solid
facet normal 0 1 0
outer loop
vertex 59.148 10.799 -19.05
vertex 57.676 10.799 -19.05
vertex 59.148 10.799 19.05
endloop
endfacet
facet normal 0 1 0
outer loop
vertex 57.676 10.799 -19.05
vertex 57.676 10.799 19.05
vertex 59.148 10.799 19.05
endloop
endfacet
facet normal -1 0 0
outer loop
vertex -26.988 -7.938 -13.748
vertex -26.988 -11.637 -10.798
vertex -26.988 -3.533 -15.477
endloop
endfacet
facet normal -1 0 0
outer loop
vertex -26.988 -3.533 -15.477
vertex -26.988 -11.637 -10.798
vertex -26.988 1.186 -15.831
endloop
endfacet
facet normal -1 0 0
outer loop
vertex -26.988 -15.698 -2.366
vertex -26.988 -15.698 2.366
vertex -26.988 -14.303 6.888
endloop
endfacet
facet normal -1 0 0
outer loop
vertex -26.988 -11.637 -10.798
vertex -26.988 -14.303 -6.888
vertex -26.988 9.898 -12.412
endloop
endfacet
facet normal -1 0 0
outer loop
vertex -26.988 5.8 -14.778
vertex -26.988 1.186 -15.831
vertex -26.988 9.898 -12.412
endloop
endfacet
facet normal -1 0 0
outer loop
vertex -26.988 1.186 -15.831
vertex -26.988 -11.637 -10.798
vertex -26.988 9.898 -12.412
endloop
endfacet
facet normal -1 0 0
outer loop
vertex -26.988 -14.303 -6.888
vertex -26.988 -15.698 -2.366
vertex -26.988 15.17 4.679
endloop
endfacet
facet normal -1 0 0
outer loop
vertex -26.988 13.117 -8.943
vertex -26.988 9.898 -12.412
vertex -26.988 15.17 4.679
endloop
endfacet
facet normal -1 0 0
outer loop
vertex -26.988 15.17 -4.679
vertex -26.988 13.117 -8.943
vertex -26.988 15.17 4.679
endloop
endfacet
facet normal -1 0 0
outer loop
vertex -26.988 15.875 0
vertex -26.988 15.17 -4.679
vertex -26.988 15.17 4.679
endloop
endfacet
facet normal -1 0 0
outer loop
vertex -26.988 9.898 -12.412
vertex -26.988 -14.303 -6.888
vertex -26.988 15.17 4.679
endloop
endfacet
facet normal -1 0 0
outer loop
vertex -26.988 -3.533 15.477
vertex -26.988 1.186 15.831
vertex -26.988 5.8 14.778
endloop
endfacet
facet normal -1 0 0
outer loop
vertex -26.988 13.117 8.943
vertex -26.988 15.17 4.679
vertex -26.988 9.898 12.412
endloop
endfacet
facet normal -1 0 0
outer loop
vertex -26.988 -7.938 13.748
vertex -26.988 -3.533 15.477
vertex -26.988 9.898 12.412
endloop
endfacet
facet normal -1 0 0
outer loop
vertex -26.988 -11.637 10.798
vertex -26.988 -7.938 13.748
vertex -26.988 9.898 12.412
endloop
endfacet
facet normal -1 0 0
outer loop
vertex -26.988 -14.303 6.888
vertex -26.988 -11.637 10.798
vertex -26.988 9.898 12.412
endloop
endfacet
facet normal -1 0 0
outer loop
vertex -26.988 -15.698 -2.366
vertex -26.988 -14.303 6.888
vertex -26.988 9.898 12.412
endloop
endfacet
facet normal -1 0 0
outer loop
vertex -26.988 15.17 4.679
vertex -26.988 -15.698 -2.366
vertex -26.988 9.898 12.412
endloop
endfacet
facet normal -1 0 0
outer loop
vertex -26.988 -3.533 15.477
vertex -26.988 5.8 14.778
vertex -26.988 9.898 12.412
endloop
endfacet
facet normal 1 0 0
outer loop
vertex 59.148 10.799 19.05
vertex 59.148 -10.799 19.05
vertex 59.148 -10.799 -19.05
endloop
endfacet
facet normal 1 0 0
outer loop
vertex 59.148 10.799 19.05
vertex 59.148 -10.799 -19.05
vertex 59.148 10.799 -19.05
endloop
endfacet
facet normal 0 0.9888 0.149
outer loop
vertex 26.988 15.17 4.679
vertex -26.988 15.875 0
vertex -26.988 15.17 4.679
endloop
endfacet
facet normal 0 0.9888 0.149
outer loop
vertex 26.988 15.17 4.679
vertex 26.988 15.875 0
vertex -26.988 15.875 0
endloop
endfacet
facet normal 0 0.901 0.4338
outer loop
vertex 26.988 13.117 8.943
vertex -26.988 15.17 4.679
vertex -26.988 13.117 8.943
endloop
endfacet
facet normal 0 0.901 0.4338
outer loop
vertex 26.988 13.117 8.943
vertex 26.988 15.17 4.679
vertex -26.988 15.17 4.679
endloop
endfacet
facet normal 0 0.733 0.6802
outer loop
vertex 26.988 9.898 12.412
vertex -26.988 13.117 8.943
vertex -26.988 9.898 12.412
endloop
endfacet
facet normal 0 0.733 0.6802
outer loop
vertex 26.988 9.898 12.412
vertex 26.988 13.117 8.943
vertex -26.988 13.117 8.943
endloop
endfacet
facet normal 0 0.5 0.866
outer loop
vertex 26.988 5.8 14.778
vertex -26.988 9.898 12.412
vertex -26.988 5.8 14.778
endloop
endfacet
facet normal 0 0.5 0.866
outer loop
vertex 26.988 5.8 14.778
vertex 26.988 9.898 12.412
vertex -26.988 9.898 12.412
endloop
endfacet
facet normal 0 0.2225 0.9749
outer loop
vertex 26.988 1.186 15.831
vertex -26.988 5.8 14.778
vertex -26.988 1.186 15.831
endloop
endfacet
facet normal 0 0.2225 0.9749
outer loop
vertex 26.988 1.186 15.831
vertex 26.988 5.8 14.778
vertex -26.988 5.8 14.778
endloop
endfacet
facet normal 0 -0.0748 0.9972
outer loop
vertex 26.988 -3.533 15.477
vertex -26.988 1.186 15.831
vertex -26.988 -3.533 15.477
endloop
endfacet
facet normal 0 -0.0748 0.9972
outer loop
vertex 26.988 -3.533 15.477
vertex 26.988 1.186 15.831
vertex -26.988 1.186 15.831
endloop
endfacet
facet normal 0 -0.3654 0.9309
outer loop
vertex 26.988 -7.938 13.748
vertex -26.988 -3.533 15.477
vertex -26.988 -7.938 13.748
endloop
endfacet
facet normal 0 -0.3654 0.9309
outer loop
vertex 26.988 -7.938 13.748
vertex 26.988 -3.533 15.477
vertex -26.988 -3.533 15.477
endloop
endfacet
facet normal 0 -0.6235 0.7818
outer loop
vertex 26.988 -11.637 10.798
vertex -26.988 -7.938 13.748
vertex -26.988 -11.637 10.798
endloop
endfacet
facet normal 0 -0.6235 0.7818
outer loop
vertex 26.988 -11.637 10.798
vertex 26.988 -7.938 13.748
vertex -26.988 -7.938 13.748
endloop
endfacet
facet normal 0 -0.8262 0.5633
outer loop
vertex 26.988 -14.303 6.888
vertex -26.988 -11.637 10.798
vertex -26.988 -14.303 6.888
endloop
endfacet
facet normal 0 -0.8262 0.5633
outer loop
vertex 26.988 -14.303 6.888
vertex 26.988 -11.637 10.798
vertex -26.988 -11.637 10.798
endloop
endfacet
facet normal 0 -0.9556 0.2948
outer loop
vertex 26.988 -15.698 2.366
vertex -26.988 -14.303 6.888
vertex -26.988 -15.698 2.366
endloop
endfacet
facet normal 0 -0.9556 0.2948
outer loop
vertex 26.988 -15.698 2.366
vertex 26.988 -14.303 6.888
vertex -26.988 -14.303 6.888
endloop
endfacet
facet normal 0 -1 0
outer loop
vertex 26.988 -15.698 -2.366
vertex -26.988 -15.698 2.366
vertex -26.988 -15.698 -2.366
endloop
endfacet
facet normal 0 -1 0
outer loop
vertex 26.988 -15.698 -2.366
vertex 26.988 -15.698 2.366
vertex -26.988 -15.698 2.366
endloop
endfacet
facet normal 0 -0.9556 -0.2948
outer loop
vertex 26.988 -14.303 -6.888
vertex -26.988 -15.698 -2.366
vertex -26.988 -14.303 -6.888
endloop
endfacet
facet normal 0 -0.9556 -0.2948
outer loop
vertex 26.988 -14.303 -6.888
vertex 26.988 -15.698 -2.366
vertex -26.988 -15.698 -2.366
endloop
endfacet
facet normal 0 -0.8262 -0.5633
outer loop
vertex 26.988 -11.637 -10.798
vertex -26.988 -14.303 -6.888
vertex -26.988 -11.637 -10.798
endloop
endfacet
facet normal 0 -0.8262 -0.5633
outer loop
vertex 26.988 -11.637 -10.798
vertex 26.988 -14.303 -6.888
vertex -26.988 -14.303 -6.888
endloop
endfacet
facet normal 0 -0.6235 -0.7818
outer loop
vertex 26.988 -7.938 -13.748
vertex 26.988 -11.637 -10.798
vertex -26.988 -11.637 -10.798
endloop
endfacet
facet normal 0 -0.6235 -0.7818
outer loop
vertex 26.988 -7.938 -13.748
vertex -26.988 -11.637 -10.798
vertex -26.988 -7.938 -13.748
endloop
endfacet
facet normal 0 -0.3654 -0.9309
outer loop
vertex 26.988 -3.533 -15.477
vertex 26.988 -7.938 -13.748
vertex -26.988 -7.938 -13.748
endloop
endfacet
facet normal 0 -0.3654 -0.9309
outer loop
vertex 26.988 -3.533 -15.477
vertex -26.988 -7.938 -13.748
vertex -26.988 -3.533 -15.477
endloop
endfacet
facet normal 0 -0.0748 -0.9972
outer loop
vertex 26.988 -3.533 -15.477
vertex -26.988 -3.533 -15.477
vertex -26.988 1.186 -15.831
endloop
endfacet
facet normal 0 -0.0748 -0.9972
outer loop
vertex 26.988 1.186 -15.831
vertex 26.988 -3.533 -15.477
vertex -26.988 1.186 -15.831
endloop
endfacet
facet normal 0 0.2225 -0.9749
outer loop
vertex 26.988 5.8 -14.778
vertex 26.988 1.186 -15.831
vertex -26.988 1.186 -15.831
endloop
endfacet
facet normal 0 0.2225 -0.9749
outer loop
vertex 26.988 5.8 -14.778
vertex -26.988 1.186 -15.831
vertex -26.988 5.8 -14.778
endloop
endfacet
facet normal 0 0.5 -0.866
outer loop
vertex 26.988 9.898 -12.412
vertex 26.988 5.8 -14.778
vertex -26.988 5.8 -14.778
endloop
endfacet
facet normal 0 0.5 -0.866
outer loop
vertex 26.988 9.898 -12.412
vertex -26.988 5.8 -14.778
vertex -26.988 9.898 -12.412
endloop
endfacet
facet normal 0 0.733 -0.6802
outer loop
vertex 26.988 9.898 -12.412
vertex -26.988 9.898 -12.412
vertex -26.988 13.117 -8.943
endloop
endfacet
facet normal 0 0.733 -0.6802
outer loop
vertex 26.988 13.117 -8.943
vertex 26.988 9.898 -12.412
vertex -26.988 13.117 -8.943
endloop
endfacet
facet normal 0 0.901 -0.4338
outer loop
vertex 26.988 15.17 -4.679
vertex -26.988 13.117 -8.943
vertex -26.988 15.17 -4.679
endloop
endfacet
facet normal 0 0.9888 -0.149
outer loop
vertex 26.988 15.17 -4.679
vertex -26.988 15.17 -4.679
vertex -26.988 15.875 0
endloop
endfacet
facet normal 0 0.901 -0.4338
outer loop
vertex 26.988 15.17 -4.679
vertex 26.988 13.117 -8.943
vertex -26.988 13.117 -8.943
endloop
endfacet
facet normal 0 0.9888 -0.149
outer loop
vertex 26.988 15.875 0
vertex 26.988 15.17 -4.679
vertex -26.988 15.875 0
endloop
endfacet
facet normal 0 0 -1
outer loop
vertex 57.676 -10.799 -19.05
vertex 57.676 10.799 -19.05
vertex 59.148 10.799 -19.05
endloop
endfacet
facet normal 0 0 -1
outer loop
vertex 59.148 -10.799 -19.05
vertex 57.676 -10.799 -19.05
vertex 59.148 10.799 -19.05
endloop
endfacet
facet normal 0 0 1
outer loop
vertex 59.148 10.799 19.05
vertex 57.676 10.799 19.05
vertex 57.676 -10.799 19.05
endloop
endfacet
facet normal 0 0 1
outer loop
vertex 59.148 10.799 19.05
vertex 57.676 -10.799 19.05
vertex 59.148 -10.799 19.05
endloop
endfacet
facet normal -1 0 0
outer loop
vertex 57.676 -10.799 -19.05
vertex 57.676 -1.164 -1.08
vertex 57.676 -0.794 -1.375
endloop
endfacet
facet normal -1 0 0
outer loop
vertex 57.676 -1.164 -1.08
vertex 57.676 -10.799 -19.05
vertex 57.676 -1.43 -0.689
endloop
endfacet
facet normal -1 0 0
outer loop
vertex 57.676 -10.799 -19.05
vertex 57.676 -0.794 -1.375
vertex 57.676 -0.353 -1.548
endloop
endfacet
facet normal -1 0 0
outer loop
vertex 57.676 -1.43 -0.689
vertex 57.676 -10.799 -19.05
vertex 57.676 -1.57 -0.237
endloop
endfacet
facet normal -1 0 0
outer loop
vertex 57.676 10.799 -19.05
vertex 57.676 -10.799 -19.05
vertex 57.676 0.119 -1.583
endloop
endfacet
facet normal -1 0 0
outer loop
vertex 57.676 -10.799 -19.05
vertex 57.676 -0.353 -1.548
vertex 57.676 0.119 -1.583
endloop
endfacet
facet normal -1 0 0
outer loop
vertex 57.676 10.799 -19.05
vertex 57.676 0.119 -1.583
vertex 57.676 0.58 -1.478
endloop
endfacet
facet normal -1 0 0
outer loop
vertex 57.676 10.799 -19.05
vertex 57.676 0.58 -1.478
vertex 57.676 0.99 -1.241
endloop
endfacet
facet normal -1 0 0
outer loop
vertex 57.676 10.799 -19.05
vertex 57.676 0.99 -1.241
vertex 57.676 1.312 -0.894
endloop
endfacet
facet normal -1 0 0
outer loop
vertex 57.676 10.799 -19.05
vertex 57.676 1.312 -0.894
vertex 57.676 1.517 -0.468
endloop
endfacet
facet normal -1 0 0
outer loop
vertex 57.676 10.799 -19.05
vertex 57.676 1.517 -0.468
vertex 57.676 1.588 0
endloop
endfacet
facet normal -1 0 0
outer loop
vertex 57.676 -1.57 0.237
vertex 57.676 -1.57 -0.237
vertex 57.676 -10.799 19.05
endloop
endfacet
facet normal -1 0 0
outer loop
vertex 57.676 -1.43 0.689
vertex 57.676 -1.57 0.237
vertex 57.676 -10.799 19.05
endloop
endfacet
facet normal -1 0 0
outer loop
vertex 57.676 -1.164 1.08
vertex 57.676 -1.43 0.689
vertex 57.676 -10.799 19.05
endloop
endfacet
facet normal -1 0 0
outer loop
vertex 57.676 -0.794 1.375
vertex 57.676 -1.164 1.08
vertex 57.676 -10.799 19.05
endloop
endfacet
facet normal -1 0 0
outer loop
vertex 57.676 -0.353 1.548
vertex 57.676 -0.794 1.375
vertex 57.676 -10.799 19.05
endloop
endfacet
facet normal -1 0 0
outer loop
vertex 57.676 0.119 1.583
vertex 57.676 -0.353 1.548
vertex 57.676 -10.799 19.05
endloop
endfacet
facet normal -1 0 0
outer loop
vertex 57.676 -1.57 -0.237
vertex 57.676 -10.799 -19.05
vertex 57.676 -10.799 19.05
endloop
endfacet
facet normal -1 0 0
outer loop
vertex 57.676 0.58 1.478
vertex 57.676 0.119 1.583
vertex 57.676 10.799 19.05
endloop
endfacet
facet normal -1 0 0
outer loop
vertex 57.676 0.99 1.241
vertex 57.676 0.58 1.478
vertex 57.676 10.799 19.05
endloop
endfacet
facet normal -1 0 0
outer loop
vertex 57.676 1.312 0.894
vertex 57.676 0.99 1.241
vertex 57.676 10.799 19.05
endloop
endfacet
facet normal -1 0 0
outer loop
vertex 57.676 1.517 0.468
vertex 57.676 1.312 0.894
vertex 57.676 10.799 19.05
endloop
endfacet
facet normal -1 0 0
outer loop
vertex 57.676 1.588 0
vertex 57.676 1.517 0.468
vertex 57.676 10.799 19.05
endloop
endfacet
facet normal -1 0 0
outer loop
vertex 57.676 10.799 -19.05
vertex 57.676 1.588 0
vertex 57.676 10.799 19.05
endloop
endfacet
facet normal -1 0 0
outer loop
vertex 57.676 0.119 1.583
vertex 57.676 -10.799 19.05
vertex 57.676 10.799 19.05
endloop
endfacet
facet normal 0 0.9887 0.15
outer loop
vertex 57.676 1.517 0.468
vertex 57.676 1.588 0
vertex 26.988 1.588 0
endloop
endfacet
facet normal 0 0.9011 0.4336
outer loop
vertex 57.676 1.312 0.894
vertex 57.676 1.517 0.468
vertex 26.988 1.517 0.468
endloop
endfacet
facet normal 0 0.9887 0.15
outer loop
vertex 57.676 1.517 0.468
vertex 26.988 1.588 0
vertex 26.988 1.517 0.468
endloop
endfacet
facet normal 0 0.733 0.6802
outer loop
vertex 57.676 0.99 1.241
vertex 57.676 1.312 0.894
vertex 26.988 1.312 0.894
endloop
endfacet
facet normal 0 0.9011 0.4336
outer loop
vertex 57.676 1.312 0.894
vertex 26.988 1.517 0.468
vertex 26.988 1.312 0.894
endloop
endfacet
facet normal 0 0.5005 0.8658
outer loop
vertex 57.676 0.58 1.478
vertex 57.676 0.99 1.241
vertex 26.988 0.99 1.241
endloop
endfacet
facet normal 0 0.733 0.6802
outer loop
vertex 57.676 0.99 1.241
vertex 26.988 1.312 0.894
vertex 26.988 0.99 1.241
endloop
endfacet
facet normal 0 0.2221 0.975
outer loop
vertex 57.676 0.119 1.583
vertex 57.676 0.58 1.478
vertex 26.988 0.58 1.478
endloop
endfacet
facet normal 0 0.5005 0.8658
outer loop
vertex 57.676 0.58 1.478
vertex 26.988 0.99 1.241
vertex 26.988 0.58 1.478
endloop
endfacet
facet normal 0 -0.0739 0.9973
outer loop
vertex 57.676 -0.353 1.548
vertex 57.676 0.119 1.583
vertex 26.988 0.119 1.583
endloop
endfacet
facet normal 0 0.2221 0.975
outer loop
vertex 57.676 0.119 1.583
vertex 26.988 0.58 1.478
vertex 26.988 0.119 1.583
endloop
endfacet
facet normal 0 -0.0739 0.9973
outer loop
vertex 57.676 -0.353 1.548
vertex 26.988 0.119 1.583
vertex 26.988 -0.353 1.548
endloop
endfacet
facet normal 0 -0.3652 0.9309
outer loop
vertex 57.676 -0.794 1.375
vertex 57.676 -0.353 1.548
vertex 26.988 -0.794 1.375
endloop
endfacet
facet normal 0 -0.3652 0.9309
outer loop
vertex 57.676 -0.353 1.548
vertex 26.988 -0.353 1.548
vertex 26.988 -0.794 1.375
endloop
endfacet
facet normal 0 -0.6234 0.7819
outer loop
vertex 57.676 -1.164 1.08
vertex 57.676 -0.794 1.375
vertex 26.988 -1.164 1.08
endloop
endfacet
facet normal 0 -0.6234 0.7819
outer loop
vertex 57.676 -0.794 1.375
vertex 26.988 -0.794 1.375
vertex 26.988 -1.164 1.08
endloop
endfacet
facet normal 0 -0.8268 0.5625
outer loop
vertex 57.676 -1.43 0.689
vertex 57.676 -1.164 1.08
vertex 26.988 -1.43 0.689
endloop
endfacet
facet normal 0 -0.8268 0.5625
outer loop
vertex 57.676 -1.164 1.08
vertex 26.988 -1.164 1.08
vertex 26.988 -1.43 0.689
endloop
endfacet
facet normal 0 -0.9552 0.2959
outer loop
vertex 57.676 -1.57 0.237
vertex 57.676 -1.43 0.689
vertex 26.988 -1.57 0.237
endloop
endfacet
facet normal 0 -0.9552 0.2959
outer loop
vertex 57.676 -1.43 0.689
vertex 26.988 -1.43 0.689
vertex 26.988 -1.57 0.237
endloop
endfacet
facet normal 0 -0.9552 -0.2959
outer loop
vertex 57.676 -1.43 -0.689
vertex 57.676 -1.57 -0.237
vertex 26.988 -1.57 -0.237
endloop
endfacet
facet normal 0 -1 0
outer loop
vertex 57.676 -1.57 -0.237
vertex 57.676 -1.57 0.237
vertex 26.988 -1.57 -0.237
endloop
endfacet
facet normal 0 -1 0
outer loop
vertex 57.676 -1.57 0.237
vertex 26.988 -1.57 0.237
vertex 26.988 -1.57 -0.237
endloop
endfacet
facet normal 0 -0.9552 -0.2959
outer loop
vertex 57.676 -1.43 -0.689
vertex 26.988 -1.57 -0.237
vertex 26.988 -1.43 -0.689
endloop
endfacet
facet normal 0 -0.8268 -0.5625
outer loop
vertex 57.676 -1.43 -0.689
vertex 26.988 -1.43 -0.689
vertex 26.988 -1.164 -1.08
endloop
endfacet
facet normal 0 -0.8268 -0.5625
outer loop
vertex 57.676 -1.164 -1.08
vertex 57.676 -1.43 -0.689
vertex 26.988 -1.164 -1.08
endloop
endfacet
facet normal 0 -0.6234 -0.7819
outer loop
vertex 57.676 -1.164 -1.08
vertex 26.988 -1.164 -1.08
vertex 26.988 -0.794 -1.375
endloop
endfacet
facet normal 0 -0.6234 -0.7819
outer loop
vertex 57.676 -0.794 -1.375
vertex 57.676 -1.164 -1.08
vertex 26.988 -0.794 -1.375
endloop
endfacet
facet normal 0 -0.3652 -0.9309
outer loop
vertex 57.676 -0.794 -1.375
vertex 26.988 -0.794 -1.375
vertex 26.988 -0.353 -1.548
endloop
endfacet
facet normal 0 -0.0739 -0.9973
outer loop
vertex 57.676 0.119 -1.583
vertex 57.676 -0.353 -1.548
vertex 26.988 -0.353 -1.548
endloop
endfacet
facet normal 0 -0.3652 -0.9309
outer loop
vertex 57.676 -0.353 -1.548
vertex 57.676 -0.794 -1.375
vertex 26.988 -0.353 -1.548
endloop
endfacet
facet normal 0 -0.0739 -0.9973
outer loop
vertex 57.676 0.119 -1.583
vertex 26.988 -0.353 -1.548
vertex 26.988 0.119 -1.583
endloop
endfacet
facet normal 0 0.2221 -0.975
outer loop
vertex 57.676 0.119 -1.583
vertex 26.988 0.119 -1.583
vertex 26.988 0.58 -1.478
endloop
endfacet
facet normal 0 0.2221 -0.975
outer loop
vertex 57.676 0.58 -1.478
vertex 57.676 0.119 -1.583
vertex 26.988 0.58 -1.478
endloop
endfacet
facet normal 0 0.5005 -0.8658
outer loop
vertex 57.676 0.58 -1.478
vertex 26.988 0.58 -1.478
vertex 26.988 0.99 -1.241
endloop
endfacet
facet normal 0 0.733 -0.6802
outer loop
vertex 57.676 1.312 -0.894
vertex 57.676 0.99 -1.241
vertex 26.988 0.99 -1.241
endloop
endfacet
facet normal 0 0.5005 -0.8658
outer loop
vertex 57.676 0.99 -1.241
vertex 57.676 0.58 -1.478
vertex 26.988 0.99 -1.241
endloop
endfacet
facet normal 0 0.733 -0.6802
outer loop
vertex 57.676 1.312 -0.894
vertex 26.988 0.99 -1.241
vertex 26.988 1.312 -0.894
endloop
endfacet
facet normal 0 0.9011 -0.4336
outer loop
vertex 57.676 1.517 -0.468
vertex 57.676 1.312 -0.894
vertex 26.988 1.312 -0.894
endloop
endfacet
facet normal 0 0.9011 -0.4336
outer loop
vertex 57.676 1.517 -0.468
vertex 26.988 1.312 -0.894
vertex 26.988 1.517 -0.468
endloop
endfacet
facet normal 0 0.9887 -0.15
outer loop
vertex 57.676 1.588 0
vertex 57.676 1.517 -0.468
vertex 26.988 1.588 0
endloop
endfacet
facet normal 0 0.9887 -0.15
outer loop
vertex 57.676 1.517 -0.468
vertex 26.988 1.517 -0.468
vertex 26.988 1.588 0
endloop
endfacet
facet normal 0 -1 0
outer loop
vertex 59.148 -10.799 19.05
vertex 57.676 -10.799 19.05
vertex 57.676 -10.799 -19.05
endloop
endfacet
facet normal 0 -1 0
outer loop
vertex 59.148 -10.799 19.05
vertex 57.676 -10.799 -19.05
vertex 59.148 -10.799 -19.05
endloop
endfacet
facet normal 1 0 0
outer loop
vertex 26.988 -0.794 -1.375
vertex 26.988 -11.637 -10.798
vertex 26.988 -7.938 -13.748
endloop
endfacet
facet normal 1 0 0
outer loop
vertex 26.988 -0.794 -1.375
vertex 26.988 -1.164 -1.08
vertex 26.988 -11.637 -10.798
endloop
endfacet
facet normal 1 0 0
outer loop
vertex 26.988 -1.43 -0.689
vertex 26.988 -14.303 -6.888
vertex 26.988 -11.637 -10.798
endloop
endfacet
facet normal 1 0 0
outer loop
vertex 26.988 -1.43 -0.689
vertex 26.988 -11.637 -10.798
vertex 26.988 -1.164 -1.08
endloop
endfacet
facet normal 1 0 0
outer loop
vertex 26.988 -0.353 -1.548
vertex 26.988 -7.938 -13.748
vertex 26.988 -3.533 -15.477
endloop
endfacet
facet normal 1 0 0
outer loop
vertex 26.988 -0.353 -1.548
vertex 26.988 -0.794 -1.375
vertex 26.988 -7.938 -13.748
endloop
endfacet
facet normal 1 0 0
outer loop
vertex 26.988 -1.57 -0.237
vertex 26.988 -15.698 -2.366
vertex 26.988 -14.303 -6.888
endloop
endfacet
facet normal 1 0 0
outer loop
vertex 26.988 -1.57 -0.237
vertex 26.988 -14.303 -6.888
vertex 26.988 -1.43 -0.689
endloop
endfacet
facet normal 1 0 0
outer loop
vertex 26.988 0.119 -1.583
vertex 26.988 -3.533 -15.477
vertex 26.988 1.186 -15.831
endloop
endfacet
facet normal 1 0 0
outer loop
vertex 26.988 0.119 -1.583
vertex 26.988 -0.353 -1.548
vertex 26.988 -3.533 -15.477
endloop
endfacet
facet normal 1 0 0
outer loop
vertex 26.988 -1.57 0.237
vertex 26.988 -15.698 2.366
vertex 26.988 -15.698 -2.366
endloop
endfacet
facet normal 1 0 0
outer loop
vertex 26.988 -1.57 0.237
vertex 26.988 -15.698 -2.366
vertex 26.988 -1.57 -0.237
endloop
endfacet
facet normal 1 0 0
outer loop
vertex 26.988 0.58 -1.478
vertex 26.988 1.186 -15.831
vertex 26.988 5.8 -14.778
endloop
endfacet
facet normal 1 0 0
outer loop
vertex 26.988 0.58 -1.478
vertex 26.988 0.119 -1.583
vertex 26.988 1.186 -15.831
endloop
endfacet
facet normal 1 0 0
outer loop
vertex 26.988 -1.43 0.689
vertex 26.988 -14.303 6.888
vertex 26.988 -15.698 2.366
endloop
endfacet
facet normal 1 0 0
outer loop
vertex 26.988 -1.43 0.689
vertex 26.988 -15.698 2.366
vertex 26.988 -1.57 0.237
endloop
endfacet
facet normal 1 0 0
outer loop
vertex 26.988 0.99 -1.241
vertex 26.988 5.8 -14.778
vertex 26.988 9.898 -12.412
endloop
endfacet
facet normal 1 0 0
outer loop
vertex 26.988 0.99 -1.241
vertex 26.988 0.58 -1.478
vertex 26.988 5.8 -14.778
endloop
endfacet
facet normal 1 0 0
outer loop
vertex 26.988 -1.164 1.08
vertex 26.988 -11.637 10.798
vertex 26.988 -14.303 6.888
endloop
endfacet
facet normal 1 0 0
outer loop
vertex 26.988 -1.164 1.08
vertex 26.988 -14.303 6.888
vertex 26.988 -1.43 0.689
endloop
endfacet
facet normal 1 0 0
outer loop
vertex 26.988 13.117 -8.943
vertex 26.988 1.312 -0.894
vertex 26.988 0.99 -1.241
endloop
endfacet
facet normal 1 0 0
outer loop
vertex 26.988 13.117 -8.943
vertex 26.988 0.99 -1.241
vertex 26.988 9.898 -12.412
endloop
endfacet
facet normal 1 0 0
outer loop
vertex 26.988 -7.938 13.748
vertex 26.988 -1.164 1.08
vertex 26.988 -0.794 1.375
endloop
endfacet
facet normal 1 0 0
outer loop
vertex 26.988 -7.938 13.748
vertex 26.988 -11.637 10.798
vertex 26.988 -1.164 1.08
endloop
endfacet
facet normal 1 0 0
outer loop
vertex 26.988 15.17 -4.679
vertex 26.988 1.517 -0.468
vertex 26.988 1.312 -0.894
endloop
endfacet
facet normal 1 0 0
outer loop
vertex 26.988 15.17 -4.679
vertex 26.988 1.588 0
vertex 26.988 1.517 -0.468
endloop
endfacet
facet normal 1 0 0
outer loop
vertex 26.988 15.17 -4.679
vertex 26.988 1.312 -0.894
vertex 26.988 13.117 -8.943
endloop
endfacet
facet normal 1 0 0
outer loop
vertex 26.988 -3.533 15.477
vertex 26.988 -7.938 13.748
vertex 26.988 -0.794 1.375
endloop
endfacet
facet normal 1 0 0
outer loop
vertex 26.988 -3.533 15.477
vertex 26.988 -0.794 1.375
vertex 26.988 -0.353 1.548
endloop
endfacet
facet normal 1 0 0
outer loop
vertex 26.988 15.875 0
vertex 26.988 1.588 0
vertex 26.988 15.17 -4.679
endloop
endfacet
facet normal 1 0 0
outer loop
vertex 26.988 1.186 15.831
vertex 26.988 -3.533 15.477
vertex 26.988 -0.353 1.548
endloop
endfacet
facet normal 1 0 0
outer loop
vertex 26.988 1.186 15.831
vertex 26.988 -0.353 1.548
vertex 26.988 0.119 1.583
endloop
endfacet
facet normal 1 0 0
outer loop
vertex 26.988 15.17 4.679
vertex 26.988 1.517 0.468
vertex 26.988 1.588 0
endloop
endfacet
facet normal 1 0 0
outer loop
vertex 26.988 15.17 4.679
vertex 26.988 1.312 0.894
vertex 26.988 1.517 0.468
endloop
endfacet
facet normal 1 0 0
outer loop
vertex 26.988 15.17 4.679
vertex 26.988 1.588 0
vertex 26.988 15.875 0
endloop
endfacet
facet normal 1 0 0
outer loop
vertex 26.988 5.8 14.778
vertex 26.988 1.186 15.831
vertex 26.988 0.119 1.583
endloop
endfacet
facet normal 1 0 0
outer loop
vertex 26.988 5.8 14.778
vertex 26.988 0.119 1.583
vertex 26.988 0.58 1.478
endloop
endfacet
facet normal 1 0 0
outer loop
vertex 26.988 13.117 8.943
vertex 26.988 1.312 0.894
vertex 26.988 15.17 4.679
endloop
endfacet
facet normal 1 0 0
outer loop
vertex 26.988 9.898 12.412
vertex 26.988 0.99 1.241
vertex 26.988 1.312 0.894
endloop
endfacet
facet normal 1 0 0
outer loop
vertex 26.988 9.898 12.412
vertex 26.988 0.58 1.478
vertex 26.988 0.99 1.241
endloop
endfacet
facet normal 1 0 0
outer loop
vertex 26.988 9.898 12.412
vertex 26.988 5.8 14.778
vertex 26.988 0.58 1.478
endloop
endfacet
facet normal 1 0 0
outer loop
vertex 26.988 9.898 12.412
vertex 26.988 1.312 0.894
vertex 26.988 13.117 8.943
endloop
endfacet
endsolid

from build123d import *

# Parameters (mm, degrees)
F0_R     = 15.875
F1_DEPTH = 26.9875
F2_R     = 1.5875
F3_DEPTH = 31.75
F4_W     = 1.47257
F4_H     = 21.597792
F5_DEPTH = 19.05


with BuildPart() as f1:
    # F0 (on Right) → F1 (new body, symmetric)
    with BuildSketch(Plane.YZ):
        Circle(F0_R)
    extrude(amount=F1_DEPTH, both=True)

    # F2 (on face) → F3 (join)
    with BuildSketch(Plane.YZ.offset(26.9875)):
        Circle(F2_R)
    extrude(amount=F3_DEPTH)

    # F4 (on Top) → F5 (join, symmetric)
    with BuildSketch(Plane.XY):
        with Locations((58.412209, 0)):
            Rectangle(F4_W, F4_H)
    extrude(amount=F5_DEPTH, both=True)


solid = f1.part
